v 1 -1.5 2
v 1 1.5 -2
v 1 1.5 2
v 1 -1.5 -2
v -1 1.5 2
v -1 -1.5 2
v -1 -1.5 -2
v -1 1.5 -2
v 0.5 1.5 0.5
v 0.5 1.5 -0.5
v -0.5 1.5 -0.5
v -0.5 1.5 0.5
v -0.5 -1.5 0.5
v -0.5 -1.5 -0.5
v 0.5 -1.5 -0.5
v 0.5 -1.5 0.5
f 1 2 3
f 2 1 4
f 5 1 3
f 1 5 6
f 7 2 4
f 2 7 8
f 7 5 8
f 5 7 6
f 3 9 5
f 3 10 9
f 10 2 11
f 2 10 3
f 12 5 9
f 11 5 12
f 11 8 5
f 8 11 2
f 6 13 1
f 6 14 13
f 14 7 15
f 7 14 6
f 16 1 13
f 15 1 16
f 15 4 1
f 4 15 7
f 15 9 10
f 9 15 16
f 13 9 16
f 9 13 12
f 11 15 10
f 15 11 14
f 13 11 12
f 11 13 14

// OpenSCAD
module work() {
    difference() {
	    cube([2,3,4], center=true);
	    cube([1,99,1], center=true);
    }
}
work();
